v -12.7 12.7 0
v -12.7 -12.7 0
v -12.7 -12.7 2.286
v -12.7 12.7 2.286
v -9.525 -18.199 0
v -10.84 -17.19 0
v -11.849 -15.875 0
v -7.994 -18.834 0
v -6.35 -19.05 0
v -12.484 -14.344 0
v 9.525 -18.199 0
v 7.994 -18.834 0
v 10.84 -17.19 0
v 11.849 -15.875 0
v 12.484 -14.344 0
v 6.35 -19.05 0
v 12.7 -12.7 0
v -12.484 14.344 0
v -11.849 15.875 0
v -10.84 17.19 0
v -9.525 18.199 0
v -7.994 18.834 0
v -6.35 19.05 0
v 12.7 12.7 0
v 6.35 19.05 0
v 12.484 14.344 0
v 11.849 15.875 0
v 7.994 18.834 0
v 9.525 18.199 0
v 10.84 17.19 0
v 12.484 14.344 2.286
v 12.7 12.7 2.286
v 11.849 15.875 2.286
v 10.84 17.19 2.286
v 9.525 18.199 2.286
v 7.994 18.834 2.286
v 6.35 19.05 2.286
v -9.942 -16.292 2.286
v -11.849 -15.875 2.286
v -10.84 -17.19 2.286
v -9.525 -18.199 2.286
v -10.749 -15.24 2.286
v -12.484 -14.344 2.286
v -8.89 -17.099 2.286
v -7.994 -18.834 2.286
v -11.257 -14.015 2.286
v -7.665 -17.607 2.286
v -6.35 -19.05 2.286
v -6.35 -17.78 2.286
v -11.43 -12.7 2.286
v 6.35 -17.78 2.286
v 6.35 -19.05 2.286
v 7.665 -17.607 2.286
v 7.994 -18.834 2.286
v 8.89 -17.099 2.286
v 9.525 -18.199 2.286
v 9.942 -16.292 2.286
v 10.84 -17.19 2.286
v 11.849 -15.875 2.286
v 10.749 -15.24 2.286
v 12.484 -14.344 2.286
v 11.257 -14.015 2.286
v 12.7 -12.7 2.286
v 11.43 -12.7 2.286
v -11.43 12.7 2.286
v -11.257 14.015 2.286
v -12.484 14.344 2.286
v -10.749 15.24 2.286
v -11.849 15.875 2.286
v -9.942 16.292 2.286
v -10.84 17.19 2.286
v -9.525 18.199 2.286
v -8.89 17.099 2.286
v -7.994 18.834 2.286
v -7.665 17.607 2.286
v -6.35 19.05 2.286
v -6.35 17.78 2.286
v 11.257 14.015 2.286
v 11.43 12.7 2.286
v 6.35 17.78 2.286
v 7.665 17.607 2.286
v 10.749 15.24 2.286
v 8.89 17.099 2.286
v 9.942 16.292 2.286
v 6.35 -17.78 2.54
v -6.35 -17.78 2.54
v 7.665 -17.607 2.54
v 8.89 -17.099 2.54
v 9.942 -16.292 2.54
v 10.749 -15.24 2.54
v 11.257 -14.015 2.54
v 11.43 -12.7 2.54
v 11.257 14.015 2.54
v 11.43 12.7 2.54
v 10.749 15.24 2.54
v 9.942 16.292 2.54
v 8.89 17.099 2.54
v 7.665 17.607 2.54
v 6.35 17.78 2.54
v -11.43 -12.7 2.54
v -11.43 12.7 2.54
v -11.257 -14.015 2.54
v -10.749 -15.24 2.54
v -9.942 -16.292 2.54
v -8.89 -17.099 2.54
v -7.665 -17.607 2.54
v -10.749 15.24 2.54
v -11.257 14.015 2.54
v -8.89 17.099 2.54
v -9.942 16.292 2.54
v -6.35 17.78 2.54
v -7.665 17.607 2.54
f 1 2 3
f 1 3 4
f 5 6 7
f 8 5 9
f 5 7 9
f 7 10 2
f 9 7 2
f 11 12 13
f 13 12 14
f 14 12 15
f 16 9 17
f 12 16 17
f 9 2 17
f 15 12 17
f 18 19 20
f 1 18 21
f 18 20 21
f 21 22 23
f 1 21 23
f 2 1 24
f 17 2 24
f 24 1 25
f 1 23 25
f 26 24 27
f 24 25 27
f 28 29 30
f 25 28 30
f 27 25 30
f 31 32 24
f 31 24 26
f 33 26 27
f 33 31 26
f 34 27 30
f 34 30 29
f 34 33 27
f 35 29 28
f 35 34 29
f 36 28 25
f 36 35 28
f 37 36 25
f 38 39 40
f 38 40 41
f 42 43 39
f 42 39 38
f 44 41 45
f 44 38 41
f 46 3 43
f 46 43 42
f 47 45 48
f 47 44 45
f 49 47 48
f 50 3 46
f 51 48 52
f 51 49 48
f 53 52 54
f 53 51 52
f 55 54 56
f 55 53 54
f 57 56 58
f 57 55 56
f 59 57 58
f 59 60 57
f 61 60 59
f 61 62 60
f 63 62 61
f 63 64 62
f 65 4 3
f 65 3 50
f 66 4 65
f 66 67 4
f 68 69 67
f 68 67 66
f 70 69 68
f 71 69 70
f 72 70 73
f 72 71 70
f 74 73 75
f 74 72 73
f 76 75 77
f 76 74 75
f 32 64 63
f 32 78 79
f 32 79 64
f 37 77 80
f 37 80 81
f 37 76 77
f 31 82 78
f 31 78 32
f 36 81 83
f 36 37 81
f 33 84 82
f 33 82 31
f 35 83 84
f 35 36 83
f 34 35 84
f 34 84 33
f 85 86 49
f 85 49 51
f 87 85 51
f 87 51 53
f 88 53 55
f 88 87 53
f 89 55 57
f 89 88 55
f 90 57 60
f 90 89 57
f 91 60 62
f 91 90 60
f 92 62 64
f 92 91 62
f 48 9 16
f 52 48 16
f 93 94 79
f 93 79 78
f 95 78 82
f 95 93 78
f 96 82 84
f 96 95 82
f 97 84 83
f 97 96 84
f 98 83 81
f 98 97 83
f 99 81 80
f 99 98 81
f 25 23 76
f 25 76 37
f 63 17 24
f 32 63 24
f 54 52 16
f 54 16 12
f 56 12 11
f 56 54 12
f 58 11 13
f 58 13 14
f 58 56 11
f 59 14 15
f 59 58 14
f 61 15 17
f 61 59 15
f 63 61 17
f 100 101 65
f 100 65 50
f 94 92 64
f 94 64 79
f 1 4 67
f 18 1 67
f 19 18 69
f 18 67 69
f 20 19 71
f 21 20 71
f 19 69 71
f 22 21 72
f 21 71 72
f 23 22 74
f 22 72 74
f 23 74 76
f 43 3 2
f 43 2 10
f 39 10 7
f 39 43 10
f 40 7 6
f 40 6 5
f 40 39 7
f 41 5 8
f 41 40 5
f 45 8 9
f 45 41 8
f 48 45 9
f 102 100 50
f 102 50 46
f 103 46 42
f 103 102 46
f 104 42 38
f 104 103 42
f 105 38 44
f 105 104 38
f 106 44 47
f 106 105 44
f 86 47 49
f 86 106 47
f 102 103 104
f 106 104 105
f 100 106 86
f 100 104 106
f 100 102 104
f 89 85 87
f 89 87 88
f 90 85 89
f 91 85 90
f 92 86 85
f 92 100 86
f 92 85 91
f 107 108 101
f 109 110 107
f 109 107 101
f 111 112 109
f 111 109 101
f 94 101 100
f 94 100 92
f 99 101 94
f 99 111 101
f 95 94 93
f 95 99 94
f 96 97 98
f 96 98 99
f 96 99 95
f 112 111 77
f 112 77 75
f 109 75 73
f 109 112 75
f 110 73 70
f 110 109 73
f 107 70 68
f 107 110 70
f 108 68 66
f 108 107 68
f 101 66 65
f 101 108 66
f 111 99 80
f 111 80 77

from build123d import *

# Parameters (mm, degrees)
SKETCH1_W           = 25.4
SKETCH1_H           = 38.1
BOSS_EXTRUDE1_DEPTH = 2.54
FILLET1_R           = 6.35
CUT_EXTRUDE1_DEPTH  = 0.254


with BuildPart() as part:
    # Sketch1 → Boss-Extrude1 (new body)
    with BuildSketch(Plane.XY):
        Rectangle(SKETCH1_W, SKETCH1_H)
    extrude(amount=BOSS_EXTRUDE1_DEPTH)

    # Fillet1
    fillet1_edges = [part.edges().sort_by_distance(p)[0] for p in [
        (12.7, -19.05, 1.27),
        (-12.7, -19.05, 1.27),
        (-12.7, 19.05, 1.27),
        (12.7, 19.05, 1.27),
    ]]
    fillet(fillet1_edges, radius=FILLET1_R)

    # Sketch2 → Cut-Extrude1 (cut)
    with BuildSketch(Plane.XY.offset(2.54)):
        with BuildLine():
            Line((-6.35, -19.05), (6.35, -19.05))
            ThreePointArc((6.35, -19.05), (10.840128061, -17.190128061), (12.7, -12.7))
            Line((12.7, -12.7), (12.7, 12.7))
            ThreePointArc((12.7, 12.7), (10.840128061, 17.190128061), (6.35, 19.05))
            Line((6.35, 19.05), (-6.35, 19.05))
            ThreePointArc((-6.35, 19.05), (-10.840128061, 17.190128061), (-12.7, 12.7))
            Line((-12.7, 12.7), (-12.7, -12.7))
            ThreePointArc((-12.7, -12.7), (-10.840128061, -17.190128061), (-6.35, -19.05))
        make_face()
        with BuildLine():
            Line((-11.43, 12.7), (-11.43, -12.7))
            ThreePointArc((-11.43, -12.7), (-9.942102448, -16.292102448), (-6.35, -17.78))
            Line((-6.35, -17.78), (6.35, -17.78))
            ThreePointArc((6.35, -17.78), (9.942102448, -16.292102448), (11.43, -12.7))
            Line((11.43, -12.7), (11.43, 12.7))
            ThreePointArc((11.43, 12.7), (9.942102448, 16.292102448), (6.35, 17.78))
            Line((6.35, 17.78), (-6.35, 17.78))
            ThreePointArc((-6.35, 17.78), (-9.942102448, 16.292102448), (-11.43, 12.7))
        make_face(mode=Mode.SUBTRACT)
    extrude(amount=-CUT_EXTRUDE1_DEPTH, mode=Mode.SUBTRACT)


solid = part.part
